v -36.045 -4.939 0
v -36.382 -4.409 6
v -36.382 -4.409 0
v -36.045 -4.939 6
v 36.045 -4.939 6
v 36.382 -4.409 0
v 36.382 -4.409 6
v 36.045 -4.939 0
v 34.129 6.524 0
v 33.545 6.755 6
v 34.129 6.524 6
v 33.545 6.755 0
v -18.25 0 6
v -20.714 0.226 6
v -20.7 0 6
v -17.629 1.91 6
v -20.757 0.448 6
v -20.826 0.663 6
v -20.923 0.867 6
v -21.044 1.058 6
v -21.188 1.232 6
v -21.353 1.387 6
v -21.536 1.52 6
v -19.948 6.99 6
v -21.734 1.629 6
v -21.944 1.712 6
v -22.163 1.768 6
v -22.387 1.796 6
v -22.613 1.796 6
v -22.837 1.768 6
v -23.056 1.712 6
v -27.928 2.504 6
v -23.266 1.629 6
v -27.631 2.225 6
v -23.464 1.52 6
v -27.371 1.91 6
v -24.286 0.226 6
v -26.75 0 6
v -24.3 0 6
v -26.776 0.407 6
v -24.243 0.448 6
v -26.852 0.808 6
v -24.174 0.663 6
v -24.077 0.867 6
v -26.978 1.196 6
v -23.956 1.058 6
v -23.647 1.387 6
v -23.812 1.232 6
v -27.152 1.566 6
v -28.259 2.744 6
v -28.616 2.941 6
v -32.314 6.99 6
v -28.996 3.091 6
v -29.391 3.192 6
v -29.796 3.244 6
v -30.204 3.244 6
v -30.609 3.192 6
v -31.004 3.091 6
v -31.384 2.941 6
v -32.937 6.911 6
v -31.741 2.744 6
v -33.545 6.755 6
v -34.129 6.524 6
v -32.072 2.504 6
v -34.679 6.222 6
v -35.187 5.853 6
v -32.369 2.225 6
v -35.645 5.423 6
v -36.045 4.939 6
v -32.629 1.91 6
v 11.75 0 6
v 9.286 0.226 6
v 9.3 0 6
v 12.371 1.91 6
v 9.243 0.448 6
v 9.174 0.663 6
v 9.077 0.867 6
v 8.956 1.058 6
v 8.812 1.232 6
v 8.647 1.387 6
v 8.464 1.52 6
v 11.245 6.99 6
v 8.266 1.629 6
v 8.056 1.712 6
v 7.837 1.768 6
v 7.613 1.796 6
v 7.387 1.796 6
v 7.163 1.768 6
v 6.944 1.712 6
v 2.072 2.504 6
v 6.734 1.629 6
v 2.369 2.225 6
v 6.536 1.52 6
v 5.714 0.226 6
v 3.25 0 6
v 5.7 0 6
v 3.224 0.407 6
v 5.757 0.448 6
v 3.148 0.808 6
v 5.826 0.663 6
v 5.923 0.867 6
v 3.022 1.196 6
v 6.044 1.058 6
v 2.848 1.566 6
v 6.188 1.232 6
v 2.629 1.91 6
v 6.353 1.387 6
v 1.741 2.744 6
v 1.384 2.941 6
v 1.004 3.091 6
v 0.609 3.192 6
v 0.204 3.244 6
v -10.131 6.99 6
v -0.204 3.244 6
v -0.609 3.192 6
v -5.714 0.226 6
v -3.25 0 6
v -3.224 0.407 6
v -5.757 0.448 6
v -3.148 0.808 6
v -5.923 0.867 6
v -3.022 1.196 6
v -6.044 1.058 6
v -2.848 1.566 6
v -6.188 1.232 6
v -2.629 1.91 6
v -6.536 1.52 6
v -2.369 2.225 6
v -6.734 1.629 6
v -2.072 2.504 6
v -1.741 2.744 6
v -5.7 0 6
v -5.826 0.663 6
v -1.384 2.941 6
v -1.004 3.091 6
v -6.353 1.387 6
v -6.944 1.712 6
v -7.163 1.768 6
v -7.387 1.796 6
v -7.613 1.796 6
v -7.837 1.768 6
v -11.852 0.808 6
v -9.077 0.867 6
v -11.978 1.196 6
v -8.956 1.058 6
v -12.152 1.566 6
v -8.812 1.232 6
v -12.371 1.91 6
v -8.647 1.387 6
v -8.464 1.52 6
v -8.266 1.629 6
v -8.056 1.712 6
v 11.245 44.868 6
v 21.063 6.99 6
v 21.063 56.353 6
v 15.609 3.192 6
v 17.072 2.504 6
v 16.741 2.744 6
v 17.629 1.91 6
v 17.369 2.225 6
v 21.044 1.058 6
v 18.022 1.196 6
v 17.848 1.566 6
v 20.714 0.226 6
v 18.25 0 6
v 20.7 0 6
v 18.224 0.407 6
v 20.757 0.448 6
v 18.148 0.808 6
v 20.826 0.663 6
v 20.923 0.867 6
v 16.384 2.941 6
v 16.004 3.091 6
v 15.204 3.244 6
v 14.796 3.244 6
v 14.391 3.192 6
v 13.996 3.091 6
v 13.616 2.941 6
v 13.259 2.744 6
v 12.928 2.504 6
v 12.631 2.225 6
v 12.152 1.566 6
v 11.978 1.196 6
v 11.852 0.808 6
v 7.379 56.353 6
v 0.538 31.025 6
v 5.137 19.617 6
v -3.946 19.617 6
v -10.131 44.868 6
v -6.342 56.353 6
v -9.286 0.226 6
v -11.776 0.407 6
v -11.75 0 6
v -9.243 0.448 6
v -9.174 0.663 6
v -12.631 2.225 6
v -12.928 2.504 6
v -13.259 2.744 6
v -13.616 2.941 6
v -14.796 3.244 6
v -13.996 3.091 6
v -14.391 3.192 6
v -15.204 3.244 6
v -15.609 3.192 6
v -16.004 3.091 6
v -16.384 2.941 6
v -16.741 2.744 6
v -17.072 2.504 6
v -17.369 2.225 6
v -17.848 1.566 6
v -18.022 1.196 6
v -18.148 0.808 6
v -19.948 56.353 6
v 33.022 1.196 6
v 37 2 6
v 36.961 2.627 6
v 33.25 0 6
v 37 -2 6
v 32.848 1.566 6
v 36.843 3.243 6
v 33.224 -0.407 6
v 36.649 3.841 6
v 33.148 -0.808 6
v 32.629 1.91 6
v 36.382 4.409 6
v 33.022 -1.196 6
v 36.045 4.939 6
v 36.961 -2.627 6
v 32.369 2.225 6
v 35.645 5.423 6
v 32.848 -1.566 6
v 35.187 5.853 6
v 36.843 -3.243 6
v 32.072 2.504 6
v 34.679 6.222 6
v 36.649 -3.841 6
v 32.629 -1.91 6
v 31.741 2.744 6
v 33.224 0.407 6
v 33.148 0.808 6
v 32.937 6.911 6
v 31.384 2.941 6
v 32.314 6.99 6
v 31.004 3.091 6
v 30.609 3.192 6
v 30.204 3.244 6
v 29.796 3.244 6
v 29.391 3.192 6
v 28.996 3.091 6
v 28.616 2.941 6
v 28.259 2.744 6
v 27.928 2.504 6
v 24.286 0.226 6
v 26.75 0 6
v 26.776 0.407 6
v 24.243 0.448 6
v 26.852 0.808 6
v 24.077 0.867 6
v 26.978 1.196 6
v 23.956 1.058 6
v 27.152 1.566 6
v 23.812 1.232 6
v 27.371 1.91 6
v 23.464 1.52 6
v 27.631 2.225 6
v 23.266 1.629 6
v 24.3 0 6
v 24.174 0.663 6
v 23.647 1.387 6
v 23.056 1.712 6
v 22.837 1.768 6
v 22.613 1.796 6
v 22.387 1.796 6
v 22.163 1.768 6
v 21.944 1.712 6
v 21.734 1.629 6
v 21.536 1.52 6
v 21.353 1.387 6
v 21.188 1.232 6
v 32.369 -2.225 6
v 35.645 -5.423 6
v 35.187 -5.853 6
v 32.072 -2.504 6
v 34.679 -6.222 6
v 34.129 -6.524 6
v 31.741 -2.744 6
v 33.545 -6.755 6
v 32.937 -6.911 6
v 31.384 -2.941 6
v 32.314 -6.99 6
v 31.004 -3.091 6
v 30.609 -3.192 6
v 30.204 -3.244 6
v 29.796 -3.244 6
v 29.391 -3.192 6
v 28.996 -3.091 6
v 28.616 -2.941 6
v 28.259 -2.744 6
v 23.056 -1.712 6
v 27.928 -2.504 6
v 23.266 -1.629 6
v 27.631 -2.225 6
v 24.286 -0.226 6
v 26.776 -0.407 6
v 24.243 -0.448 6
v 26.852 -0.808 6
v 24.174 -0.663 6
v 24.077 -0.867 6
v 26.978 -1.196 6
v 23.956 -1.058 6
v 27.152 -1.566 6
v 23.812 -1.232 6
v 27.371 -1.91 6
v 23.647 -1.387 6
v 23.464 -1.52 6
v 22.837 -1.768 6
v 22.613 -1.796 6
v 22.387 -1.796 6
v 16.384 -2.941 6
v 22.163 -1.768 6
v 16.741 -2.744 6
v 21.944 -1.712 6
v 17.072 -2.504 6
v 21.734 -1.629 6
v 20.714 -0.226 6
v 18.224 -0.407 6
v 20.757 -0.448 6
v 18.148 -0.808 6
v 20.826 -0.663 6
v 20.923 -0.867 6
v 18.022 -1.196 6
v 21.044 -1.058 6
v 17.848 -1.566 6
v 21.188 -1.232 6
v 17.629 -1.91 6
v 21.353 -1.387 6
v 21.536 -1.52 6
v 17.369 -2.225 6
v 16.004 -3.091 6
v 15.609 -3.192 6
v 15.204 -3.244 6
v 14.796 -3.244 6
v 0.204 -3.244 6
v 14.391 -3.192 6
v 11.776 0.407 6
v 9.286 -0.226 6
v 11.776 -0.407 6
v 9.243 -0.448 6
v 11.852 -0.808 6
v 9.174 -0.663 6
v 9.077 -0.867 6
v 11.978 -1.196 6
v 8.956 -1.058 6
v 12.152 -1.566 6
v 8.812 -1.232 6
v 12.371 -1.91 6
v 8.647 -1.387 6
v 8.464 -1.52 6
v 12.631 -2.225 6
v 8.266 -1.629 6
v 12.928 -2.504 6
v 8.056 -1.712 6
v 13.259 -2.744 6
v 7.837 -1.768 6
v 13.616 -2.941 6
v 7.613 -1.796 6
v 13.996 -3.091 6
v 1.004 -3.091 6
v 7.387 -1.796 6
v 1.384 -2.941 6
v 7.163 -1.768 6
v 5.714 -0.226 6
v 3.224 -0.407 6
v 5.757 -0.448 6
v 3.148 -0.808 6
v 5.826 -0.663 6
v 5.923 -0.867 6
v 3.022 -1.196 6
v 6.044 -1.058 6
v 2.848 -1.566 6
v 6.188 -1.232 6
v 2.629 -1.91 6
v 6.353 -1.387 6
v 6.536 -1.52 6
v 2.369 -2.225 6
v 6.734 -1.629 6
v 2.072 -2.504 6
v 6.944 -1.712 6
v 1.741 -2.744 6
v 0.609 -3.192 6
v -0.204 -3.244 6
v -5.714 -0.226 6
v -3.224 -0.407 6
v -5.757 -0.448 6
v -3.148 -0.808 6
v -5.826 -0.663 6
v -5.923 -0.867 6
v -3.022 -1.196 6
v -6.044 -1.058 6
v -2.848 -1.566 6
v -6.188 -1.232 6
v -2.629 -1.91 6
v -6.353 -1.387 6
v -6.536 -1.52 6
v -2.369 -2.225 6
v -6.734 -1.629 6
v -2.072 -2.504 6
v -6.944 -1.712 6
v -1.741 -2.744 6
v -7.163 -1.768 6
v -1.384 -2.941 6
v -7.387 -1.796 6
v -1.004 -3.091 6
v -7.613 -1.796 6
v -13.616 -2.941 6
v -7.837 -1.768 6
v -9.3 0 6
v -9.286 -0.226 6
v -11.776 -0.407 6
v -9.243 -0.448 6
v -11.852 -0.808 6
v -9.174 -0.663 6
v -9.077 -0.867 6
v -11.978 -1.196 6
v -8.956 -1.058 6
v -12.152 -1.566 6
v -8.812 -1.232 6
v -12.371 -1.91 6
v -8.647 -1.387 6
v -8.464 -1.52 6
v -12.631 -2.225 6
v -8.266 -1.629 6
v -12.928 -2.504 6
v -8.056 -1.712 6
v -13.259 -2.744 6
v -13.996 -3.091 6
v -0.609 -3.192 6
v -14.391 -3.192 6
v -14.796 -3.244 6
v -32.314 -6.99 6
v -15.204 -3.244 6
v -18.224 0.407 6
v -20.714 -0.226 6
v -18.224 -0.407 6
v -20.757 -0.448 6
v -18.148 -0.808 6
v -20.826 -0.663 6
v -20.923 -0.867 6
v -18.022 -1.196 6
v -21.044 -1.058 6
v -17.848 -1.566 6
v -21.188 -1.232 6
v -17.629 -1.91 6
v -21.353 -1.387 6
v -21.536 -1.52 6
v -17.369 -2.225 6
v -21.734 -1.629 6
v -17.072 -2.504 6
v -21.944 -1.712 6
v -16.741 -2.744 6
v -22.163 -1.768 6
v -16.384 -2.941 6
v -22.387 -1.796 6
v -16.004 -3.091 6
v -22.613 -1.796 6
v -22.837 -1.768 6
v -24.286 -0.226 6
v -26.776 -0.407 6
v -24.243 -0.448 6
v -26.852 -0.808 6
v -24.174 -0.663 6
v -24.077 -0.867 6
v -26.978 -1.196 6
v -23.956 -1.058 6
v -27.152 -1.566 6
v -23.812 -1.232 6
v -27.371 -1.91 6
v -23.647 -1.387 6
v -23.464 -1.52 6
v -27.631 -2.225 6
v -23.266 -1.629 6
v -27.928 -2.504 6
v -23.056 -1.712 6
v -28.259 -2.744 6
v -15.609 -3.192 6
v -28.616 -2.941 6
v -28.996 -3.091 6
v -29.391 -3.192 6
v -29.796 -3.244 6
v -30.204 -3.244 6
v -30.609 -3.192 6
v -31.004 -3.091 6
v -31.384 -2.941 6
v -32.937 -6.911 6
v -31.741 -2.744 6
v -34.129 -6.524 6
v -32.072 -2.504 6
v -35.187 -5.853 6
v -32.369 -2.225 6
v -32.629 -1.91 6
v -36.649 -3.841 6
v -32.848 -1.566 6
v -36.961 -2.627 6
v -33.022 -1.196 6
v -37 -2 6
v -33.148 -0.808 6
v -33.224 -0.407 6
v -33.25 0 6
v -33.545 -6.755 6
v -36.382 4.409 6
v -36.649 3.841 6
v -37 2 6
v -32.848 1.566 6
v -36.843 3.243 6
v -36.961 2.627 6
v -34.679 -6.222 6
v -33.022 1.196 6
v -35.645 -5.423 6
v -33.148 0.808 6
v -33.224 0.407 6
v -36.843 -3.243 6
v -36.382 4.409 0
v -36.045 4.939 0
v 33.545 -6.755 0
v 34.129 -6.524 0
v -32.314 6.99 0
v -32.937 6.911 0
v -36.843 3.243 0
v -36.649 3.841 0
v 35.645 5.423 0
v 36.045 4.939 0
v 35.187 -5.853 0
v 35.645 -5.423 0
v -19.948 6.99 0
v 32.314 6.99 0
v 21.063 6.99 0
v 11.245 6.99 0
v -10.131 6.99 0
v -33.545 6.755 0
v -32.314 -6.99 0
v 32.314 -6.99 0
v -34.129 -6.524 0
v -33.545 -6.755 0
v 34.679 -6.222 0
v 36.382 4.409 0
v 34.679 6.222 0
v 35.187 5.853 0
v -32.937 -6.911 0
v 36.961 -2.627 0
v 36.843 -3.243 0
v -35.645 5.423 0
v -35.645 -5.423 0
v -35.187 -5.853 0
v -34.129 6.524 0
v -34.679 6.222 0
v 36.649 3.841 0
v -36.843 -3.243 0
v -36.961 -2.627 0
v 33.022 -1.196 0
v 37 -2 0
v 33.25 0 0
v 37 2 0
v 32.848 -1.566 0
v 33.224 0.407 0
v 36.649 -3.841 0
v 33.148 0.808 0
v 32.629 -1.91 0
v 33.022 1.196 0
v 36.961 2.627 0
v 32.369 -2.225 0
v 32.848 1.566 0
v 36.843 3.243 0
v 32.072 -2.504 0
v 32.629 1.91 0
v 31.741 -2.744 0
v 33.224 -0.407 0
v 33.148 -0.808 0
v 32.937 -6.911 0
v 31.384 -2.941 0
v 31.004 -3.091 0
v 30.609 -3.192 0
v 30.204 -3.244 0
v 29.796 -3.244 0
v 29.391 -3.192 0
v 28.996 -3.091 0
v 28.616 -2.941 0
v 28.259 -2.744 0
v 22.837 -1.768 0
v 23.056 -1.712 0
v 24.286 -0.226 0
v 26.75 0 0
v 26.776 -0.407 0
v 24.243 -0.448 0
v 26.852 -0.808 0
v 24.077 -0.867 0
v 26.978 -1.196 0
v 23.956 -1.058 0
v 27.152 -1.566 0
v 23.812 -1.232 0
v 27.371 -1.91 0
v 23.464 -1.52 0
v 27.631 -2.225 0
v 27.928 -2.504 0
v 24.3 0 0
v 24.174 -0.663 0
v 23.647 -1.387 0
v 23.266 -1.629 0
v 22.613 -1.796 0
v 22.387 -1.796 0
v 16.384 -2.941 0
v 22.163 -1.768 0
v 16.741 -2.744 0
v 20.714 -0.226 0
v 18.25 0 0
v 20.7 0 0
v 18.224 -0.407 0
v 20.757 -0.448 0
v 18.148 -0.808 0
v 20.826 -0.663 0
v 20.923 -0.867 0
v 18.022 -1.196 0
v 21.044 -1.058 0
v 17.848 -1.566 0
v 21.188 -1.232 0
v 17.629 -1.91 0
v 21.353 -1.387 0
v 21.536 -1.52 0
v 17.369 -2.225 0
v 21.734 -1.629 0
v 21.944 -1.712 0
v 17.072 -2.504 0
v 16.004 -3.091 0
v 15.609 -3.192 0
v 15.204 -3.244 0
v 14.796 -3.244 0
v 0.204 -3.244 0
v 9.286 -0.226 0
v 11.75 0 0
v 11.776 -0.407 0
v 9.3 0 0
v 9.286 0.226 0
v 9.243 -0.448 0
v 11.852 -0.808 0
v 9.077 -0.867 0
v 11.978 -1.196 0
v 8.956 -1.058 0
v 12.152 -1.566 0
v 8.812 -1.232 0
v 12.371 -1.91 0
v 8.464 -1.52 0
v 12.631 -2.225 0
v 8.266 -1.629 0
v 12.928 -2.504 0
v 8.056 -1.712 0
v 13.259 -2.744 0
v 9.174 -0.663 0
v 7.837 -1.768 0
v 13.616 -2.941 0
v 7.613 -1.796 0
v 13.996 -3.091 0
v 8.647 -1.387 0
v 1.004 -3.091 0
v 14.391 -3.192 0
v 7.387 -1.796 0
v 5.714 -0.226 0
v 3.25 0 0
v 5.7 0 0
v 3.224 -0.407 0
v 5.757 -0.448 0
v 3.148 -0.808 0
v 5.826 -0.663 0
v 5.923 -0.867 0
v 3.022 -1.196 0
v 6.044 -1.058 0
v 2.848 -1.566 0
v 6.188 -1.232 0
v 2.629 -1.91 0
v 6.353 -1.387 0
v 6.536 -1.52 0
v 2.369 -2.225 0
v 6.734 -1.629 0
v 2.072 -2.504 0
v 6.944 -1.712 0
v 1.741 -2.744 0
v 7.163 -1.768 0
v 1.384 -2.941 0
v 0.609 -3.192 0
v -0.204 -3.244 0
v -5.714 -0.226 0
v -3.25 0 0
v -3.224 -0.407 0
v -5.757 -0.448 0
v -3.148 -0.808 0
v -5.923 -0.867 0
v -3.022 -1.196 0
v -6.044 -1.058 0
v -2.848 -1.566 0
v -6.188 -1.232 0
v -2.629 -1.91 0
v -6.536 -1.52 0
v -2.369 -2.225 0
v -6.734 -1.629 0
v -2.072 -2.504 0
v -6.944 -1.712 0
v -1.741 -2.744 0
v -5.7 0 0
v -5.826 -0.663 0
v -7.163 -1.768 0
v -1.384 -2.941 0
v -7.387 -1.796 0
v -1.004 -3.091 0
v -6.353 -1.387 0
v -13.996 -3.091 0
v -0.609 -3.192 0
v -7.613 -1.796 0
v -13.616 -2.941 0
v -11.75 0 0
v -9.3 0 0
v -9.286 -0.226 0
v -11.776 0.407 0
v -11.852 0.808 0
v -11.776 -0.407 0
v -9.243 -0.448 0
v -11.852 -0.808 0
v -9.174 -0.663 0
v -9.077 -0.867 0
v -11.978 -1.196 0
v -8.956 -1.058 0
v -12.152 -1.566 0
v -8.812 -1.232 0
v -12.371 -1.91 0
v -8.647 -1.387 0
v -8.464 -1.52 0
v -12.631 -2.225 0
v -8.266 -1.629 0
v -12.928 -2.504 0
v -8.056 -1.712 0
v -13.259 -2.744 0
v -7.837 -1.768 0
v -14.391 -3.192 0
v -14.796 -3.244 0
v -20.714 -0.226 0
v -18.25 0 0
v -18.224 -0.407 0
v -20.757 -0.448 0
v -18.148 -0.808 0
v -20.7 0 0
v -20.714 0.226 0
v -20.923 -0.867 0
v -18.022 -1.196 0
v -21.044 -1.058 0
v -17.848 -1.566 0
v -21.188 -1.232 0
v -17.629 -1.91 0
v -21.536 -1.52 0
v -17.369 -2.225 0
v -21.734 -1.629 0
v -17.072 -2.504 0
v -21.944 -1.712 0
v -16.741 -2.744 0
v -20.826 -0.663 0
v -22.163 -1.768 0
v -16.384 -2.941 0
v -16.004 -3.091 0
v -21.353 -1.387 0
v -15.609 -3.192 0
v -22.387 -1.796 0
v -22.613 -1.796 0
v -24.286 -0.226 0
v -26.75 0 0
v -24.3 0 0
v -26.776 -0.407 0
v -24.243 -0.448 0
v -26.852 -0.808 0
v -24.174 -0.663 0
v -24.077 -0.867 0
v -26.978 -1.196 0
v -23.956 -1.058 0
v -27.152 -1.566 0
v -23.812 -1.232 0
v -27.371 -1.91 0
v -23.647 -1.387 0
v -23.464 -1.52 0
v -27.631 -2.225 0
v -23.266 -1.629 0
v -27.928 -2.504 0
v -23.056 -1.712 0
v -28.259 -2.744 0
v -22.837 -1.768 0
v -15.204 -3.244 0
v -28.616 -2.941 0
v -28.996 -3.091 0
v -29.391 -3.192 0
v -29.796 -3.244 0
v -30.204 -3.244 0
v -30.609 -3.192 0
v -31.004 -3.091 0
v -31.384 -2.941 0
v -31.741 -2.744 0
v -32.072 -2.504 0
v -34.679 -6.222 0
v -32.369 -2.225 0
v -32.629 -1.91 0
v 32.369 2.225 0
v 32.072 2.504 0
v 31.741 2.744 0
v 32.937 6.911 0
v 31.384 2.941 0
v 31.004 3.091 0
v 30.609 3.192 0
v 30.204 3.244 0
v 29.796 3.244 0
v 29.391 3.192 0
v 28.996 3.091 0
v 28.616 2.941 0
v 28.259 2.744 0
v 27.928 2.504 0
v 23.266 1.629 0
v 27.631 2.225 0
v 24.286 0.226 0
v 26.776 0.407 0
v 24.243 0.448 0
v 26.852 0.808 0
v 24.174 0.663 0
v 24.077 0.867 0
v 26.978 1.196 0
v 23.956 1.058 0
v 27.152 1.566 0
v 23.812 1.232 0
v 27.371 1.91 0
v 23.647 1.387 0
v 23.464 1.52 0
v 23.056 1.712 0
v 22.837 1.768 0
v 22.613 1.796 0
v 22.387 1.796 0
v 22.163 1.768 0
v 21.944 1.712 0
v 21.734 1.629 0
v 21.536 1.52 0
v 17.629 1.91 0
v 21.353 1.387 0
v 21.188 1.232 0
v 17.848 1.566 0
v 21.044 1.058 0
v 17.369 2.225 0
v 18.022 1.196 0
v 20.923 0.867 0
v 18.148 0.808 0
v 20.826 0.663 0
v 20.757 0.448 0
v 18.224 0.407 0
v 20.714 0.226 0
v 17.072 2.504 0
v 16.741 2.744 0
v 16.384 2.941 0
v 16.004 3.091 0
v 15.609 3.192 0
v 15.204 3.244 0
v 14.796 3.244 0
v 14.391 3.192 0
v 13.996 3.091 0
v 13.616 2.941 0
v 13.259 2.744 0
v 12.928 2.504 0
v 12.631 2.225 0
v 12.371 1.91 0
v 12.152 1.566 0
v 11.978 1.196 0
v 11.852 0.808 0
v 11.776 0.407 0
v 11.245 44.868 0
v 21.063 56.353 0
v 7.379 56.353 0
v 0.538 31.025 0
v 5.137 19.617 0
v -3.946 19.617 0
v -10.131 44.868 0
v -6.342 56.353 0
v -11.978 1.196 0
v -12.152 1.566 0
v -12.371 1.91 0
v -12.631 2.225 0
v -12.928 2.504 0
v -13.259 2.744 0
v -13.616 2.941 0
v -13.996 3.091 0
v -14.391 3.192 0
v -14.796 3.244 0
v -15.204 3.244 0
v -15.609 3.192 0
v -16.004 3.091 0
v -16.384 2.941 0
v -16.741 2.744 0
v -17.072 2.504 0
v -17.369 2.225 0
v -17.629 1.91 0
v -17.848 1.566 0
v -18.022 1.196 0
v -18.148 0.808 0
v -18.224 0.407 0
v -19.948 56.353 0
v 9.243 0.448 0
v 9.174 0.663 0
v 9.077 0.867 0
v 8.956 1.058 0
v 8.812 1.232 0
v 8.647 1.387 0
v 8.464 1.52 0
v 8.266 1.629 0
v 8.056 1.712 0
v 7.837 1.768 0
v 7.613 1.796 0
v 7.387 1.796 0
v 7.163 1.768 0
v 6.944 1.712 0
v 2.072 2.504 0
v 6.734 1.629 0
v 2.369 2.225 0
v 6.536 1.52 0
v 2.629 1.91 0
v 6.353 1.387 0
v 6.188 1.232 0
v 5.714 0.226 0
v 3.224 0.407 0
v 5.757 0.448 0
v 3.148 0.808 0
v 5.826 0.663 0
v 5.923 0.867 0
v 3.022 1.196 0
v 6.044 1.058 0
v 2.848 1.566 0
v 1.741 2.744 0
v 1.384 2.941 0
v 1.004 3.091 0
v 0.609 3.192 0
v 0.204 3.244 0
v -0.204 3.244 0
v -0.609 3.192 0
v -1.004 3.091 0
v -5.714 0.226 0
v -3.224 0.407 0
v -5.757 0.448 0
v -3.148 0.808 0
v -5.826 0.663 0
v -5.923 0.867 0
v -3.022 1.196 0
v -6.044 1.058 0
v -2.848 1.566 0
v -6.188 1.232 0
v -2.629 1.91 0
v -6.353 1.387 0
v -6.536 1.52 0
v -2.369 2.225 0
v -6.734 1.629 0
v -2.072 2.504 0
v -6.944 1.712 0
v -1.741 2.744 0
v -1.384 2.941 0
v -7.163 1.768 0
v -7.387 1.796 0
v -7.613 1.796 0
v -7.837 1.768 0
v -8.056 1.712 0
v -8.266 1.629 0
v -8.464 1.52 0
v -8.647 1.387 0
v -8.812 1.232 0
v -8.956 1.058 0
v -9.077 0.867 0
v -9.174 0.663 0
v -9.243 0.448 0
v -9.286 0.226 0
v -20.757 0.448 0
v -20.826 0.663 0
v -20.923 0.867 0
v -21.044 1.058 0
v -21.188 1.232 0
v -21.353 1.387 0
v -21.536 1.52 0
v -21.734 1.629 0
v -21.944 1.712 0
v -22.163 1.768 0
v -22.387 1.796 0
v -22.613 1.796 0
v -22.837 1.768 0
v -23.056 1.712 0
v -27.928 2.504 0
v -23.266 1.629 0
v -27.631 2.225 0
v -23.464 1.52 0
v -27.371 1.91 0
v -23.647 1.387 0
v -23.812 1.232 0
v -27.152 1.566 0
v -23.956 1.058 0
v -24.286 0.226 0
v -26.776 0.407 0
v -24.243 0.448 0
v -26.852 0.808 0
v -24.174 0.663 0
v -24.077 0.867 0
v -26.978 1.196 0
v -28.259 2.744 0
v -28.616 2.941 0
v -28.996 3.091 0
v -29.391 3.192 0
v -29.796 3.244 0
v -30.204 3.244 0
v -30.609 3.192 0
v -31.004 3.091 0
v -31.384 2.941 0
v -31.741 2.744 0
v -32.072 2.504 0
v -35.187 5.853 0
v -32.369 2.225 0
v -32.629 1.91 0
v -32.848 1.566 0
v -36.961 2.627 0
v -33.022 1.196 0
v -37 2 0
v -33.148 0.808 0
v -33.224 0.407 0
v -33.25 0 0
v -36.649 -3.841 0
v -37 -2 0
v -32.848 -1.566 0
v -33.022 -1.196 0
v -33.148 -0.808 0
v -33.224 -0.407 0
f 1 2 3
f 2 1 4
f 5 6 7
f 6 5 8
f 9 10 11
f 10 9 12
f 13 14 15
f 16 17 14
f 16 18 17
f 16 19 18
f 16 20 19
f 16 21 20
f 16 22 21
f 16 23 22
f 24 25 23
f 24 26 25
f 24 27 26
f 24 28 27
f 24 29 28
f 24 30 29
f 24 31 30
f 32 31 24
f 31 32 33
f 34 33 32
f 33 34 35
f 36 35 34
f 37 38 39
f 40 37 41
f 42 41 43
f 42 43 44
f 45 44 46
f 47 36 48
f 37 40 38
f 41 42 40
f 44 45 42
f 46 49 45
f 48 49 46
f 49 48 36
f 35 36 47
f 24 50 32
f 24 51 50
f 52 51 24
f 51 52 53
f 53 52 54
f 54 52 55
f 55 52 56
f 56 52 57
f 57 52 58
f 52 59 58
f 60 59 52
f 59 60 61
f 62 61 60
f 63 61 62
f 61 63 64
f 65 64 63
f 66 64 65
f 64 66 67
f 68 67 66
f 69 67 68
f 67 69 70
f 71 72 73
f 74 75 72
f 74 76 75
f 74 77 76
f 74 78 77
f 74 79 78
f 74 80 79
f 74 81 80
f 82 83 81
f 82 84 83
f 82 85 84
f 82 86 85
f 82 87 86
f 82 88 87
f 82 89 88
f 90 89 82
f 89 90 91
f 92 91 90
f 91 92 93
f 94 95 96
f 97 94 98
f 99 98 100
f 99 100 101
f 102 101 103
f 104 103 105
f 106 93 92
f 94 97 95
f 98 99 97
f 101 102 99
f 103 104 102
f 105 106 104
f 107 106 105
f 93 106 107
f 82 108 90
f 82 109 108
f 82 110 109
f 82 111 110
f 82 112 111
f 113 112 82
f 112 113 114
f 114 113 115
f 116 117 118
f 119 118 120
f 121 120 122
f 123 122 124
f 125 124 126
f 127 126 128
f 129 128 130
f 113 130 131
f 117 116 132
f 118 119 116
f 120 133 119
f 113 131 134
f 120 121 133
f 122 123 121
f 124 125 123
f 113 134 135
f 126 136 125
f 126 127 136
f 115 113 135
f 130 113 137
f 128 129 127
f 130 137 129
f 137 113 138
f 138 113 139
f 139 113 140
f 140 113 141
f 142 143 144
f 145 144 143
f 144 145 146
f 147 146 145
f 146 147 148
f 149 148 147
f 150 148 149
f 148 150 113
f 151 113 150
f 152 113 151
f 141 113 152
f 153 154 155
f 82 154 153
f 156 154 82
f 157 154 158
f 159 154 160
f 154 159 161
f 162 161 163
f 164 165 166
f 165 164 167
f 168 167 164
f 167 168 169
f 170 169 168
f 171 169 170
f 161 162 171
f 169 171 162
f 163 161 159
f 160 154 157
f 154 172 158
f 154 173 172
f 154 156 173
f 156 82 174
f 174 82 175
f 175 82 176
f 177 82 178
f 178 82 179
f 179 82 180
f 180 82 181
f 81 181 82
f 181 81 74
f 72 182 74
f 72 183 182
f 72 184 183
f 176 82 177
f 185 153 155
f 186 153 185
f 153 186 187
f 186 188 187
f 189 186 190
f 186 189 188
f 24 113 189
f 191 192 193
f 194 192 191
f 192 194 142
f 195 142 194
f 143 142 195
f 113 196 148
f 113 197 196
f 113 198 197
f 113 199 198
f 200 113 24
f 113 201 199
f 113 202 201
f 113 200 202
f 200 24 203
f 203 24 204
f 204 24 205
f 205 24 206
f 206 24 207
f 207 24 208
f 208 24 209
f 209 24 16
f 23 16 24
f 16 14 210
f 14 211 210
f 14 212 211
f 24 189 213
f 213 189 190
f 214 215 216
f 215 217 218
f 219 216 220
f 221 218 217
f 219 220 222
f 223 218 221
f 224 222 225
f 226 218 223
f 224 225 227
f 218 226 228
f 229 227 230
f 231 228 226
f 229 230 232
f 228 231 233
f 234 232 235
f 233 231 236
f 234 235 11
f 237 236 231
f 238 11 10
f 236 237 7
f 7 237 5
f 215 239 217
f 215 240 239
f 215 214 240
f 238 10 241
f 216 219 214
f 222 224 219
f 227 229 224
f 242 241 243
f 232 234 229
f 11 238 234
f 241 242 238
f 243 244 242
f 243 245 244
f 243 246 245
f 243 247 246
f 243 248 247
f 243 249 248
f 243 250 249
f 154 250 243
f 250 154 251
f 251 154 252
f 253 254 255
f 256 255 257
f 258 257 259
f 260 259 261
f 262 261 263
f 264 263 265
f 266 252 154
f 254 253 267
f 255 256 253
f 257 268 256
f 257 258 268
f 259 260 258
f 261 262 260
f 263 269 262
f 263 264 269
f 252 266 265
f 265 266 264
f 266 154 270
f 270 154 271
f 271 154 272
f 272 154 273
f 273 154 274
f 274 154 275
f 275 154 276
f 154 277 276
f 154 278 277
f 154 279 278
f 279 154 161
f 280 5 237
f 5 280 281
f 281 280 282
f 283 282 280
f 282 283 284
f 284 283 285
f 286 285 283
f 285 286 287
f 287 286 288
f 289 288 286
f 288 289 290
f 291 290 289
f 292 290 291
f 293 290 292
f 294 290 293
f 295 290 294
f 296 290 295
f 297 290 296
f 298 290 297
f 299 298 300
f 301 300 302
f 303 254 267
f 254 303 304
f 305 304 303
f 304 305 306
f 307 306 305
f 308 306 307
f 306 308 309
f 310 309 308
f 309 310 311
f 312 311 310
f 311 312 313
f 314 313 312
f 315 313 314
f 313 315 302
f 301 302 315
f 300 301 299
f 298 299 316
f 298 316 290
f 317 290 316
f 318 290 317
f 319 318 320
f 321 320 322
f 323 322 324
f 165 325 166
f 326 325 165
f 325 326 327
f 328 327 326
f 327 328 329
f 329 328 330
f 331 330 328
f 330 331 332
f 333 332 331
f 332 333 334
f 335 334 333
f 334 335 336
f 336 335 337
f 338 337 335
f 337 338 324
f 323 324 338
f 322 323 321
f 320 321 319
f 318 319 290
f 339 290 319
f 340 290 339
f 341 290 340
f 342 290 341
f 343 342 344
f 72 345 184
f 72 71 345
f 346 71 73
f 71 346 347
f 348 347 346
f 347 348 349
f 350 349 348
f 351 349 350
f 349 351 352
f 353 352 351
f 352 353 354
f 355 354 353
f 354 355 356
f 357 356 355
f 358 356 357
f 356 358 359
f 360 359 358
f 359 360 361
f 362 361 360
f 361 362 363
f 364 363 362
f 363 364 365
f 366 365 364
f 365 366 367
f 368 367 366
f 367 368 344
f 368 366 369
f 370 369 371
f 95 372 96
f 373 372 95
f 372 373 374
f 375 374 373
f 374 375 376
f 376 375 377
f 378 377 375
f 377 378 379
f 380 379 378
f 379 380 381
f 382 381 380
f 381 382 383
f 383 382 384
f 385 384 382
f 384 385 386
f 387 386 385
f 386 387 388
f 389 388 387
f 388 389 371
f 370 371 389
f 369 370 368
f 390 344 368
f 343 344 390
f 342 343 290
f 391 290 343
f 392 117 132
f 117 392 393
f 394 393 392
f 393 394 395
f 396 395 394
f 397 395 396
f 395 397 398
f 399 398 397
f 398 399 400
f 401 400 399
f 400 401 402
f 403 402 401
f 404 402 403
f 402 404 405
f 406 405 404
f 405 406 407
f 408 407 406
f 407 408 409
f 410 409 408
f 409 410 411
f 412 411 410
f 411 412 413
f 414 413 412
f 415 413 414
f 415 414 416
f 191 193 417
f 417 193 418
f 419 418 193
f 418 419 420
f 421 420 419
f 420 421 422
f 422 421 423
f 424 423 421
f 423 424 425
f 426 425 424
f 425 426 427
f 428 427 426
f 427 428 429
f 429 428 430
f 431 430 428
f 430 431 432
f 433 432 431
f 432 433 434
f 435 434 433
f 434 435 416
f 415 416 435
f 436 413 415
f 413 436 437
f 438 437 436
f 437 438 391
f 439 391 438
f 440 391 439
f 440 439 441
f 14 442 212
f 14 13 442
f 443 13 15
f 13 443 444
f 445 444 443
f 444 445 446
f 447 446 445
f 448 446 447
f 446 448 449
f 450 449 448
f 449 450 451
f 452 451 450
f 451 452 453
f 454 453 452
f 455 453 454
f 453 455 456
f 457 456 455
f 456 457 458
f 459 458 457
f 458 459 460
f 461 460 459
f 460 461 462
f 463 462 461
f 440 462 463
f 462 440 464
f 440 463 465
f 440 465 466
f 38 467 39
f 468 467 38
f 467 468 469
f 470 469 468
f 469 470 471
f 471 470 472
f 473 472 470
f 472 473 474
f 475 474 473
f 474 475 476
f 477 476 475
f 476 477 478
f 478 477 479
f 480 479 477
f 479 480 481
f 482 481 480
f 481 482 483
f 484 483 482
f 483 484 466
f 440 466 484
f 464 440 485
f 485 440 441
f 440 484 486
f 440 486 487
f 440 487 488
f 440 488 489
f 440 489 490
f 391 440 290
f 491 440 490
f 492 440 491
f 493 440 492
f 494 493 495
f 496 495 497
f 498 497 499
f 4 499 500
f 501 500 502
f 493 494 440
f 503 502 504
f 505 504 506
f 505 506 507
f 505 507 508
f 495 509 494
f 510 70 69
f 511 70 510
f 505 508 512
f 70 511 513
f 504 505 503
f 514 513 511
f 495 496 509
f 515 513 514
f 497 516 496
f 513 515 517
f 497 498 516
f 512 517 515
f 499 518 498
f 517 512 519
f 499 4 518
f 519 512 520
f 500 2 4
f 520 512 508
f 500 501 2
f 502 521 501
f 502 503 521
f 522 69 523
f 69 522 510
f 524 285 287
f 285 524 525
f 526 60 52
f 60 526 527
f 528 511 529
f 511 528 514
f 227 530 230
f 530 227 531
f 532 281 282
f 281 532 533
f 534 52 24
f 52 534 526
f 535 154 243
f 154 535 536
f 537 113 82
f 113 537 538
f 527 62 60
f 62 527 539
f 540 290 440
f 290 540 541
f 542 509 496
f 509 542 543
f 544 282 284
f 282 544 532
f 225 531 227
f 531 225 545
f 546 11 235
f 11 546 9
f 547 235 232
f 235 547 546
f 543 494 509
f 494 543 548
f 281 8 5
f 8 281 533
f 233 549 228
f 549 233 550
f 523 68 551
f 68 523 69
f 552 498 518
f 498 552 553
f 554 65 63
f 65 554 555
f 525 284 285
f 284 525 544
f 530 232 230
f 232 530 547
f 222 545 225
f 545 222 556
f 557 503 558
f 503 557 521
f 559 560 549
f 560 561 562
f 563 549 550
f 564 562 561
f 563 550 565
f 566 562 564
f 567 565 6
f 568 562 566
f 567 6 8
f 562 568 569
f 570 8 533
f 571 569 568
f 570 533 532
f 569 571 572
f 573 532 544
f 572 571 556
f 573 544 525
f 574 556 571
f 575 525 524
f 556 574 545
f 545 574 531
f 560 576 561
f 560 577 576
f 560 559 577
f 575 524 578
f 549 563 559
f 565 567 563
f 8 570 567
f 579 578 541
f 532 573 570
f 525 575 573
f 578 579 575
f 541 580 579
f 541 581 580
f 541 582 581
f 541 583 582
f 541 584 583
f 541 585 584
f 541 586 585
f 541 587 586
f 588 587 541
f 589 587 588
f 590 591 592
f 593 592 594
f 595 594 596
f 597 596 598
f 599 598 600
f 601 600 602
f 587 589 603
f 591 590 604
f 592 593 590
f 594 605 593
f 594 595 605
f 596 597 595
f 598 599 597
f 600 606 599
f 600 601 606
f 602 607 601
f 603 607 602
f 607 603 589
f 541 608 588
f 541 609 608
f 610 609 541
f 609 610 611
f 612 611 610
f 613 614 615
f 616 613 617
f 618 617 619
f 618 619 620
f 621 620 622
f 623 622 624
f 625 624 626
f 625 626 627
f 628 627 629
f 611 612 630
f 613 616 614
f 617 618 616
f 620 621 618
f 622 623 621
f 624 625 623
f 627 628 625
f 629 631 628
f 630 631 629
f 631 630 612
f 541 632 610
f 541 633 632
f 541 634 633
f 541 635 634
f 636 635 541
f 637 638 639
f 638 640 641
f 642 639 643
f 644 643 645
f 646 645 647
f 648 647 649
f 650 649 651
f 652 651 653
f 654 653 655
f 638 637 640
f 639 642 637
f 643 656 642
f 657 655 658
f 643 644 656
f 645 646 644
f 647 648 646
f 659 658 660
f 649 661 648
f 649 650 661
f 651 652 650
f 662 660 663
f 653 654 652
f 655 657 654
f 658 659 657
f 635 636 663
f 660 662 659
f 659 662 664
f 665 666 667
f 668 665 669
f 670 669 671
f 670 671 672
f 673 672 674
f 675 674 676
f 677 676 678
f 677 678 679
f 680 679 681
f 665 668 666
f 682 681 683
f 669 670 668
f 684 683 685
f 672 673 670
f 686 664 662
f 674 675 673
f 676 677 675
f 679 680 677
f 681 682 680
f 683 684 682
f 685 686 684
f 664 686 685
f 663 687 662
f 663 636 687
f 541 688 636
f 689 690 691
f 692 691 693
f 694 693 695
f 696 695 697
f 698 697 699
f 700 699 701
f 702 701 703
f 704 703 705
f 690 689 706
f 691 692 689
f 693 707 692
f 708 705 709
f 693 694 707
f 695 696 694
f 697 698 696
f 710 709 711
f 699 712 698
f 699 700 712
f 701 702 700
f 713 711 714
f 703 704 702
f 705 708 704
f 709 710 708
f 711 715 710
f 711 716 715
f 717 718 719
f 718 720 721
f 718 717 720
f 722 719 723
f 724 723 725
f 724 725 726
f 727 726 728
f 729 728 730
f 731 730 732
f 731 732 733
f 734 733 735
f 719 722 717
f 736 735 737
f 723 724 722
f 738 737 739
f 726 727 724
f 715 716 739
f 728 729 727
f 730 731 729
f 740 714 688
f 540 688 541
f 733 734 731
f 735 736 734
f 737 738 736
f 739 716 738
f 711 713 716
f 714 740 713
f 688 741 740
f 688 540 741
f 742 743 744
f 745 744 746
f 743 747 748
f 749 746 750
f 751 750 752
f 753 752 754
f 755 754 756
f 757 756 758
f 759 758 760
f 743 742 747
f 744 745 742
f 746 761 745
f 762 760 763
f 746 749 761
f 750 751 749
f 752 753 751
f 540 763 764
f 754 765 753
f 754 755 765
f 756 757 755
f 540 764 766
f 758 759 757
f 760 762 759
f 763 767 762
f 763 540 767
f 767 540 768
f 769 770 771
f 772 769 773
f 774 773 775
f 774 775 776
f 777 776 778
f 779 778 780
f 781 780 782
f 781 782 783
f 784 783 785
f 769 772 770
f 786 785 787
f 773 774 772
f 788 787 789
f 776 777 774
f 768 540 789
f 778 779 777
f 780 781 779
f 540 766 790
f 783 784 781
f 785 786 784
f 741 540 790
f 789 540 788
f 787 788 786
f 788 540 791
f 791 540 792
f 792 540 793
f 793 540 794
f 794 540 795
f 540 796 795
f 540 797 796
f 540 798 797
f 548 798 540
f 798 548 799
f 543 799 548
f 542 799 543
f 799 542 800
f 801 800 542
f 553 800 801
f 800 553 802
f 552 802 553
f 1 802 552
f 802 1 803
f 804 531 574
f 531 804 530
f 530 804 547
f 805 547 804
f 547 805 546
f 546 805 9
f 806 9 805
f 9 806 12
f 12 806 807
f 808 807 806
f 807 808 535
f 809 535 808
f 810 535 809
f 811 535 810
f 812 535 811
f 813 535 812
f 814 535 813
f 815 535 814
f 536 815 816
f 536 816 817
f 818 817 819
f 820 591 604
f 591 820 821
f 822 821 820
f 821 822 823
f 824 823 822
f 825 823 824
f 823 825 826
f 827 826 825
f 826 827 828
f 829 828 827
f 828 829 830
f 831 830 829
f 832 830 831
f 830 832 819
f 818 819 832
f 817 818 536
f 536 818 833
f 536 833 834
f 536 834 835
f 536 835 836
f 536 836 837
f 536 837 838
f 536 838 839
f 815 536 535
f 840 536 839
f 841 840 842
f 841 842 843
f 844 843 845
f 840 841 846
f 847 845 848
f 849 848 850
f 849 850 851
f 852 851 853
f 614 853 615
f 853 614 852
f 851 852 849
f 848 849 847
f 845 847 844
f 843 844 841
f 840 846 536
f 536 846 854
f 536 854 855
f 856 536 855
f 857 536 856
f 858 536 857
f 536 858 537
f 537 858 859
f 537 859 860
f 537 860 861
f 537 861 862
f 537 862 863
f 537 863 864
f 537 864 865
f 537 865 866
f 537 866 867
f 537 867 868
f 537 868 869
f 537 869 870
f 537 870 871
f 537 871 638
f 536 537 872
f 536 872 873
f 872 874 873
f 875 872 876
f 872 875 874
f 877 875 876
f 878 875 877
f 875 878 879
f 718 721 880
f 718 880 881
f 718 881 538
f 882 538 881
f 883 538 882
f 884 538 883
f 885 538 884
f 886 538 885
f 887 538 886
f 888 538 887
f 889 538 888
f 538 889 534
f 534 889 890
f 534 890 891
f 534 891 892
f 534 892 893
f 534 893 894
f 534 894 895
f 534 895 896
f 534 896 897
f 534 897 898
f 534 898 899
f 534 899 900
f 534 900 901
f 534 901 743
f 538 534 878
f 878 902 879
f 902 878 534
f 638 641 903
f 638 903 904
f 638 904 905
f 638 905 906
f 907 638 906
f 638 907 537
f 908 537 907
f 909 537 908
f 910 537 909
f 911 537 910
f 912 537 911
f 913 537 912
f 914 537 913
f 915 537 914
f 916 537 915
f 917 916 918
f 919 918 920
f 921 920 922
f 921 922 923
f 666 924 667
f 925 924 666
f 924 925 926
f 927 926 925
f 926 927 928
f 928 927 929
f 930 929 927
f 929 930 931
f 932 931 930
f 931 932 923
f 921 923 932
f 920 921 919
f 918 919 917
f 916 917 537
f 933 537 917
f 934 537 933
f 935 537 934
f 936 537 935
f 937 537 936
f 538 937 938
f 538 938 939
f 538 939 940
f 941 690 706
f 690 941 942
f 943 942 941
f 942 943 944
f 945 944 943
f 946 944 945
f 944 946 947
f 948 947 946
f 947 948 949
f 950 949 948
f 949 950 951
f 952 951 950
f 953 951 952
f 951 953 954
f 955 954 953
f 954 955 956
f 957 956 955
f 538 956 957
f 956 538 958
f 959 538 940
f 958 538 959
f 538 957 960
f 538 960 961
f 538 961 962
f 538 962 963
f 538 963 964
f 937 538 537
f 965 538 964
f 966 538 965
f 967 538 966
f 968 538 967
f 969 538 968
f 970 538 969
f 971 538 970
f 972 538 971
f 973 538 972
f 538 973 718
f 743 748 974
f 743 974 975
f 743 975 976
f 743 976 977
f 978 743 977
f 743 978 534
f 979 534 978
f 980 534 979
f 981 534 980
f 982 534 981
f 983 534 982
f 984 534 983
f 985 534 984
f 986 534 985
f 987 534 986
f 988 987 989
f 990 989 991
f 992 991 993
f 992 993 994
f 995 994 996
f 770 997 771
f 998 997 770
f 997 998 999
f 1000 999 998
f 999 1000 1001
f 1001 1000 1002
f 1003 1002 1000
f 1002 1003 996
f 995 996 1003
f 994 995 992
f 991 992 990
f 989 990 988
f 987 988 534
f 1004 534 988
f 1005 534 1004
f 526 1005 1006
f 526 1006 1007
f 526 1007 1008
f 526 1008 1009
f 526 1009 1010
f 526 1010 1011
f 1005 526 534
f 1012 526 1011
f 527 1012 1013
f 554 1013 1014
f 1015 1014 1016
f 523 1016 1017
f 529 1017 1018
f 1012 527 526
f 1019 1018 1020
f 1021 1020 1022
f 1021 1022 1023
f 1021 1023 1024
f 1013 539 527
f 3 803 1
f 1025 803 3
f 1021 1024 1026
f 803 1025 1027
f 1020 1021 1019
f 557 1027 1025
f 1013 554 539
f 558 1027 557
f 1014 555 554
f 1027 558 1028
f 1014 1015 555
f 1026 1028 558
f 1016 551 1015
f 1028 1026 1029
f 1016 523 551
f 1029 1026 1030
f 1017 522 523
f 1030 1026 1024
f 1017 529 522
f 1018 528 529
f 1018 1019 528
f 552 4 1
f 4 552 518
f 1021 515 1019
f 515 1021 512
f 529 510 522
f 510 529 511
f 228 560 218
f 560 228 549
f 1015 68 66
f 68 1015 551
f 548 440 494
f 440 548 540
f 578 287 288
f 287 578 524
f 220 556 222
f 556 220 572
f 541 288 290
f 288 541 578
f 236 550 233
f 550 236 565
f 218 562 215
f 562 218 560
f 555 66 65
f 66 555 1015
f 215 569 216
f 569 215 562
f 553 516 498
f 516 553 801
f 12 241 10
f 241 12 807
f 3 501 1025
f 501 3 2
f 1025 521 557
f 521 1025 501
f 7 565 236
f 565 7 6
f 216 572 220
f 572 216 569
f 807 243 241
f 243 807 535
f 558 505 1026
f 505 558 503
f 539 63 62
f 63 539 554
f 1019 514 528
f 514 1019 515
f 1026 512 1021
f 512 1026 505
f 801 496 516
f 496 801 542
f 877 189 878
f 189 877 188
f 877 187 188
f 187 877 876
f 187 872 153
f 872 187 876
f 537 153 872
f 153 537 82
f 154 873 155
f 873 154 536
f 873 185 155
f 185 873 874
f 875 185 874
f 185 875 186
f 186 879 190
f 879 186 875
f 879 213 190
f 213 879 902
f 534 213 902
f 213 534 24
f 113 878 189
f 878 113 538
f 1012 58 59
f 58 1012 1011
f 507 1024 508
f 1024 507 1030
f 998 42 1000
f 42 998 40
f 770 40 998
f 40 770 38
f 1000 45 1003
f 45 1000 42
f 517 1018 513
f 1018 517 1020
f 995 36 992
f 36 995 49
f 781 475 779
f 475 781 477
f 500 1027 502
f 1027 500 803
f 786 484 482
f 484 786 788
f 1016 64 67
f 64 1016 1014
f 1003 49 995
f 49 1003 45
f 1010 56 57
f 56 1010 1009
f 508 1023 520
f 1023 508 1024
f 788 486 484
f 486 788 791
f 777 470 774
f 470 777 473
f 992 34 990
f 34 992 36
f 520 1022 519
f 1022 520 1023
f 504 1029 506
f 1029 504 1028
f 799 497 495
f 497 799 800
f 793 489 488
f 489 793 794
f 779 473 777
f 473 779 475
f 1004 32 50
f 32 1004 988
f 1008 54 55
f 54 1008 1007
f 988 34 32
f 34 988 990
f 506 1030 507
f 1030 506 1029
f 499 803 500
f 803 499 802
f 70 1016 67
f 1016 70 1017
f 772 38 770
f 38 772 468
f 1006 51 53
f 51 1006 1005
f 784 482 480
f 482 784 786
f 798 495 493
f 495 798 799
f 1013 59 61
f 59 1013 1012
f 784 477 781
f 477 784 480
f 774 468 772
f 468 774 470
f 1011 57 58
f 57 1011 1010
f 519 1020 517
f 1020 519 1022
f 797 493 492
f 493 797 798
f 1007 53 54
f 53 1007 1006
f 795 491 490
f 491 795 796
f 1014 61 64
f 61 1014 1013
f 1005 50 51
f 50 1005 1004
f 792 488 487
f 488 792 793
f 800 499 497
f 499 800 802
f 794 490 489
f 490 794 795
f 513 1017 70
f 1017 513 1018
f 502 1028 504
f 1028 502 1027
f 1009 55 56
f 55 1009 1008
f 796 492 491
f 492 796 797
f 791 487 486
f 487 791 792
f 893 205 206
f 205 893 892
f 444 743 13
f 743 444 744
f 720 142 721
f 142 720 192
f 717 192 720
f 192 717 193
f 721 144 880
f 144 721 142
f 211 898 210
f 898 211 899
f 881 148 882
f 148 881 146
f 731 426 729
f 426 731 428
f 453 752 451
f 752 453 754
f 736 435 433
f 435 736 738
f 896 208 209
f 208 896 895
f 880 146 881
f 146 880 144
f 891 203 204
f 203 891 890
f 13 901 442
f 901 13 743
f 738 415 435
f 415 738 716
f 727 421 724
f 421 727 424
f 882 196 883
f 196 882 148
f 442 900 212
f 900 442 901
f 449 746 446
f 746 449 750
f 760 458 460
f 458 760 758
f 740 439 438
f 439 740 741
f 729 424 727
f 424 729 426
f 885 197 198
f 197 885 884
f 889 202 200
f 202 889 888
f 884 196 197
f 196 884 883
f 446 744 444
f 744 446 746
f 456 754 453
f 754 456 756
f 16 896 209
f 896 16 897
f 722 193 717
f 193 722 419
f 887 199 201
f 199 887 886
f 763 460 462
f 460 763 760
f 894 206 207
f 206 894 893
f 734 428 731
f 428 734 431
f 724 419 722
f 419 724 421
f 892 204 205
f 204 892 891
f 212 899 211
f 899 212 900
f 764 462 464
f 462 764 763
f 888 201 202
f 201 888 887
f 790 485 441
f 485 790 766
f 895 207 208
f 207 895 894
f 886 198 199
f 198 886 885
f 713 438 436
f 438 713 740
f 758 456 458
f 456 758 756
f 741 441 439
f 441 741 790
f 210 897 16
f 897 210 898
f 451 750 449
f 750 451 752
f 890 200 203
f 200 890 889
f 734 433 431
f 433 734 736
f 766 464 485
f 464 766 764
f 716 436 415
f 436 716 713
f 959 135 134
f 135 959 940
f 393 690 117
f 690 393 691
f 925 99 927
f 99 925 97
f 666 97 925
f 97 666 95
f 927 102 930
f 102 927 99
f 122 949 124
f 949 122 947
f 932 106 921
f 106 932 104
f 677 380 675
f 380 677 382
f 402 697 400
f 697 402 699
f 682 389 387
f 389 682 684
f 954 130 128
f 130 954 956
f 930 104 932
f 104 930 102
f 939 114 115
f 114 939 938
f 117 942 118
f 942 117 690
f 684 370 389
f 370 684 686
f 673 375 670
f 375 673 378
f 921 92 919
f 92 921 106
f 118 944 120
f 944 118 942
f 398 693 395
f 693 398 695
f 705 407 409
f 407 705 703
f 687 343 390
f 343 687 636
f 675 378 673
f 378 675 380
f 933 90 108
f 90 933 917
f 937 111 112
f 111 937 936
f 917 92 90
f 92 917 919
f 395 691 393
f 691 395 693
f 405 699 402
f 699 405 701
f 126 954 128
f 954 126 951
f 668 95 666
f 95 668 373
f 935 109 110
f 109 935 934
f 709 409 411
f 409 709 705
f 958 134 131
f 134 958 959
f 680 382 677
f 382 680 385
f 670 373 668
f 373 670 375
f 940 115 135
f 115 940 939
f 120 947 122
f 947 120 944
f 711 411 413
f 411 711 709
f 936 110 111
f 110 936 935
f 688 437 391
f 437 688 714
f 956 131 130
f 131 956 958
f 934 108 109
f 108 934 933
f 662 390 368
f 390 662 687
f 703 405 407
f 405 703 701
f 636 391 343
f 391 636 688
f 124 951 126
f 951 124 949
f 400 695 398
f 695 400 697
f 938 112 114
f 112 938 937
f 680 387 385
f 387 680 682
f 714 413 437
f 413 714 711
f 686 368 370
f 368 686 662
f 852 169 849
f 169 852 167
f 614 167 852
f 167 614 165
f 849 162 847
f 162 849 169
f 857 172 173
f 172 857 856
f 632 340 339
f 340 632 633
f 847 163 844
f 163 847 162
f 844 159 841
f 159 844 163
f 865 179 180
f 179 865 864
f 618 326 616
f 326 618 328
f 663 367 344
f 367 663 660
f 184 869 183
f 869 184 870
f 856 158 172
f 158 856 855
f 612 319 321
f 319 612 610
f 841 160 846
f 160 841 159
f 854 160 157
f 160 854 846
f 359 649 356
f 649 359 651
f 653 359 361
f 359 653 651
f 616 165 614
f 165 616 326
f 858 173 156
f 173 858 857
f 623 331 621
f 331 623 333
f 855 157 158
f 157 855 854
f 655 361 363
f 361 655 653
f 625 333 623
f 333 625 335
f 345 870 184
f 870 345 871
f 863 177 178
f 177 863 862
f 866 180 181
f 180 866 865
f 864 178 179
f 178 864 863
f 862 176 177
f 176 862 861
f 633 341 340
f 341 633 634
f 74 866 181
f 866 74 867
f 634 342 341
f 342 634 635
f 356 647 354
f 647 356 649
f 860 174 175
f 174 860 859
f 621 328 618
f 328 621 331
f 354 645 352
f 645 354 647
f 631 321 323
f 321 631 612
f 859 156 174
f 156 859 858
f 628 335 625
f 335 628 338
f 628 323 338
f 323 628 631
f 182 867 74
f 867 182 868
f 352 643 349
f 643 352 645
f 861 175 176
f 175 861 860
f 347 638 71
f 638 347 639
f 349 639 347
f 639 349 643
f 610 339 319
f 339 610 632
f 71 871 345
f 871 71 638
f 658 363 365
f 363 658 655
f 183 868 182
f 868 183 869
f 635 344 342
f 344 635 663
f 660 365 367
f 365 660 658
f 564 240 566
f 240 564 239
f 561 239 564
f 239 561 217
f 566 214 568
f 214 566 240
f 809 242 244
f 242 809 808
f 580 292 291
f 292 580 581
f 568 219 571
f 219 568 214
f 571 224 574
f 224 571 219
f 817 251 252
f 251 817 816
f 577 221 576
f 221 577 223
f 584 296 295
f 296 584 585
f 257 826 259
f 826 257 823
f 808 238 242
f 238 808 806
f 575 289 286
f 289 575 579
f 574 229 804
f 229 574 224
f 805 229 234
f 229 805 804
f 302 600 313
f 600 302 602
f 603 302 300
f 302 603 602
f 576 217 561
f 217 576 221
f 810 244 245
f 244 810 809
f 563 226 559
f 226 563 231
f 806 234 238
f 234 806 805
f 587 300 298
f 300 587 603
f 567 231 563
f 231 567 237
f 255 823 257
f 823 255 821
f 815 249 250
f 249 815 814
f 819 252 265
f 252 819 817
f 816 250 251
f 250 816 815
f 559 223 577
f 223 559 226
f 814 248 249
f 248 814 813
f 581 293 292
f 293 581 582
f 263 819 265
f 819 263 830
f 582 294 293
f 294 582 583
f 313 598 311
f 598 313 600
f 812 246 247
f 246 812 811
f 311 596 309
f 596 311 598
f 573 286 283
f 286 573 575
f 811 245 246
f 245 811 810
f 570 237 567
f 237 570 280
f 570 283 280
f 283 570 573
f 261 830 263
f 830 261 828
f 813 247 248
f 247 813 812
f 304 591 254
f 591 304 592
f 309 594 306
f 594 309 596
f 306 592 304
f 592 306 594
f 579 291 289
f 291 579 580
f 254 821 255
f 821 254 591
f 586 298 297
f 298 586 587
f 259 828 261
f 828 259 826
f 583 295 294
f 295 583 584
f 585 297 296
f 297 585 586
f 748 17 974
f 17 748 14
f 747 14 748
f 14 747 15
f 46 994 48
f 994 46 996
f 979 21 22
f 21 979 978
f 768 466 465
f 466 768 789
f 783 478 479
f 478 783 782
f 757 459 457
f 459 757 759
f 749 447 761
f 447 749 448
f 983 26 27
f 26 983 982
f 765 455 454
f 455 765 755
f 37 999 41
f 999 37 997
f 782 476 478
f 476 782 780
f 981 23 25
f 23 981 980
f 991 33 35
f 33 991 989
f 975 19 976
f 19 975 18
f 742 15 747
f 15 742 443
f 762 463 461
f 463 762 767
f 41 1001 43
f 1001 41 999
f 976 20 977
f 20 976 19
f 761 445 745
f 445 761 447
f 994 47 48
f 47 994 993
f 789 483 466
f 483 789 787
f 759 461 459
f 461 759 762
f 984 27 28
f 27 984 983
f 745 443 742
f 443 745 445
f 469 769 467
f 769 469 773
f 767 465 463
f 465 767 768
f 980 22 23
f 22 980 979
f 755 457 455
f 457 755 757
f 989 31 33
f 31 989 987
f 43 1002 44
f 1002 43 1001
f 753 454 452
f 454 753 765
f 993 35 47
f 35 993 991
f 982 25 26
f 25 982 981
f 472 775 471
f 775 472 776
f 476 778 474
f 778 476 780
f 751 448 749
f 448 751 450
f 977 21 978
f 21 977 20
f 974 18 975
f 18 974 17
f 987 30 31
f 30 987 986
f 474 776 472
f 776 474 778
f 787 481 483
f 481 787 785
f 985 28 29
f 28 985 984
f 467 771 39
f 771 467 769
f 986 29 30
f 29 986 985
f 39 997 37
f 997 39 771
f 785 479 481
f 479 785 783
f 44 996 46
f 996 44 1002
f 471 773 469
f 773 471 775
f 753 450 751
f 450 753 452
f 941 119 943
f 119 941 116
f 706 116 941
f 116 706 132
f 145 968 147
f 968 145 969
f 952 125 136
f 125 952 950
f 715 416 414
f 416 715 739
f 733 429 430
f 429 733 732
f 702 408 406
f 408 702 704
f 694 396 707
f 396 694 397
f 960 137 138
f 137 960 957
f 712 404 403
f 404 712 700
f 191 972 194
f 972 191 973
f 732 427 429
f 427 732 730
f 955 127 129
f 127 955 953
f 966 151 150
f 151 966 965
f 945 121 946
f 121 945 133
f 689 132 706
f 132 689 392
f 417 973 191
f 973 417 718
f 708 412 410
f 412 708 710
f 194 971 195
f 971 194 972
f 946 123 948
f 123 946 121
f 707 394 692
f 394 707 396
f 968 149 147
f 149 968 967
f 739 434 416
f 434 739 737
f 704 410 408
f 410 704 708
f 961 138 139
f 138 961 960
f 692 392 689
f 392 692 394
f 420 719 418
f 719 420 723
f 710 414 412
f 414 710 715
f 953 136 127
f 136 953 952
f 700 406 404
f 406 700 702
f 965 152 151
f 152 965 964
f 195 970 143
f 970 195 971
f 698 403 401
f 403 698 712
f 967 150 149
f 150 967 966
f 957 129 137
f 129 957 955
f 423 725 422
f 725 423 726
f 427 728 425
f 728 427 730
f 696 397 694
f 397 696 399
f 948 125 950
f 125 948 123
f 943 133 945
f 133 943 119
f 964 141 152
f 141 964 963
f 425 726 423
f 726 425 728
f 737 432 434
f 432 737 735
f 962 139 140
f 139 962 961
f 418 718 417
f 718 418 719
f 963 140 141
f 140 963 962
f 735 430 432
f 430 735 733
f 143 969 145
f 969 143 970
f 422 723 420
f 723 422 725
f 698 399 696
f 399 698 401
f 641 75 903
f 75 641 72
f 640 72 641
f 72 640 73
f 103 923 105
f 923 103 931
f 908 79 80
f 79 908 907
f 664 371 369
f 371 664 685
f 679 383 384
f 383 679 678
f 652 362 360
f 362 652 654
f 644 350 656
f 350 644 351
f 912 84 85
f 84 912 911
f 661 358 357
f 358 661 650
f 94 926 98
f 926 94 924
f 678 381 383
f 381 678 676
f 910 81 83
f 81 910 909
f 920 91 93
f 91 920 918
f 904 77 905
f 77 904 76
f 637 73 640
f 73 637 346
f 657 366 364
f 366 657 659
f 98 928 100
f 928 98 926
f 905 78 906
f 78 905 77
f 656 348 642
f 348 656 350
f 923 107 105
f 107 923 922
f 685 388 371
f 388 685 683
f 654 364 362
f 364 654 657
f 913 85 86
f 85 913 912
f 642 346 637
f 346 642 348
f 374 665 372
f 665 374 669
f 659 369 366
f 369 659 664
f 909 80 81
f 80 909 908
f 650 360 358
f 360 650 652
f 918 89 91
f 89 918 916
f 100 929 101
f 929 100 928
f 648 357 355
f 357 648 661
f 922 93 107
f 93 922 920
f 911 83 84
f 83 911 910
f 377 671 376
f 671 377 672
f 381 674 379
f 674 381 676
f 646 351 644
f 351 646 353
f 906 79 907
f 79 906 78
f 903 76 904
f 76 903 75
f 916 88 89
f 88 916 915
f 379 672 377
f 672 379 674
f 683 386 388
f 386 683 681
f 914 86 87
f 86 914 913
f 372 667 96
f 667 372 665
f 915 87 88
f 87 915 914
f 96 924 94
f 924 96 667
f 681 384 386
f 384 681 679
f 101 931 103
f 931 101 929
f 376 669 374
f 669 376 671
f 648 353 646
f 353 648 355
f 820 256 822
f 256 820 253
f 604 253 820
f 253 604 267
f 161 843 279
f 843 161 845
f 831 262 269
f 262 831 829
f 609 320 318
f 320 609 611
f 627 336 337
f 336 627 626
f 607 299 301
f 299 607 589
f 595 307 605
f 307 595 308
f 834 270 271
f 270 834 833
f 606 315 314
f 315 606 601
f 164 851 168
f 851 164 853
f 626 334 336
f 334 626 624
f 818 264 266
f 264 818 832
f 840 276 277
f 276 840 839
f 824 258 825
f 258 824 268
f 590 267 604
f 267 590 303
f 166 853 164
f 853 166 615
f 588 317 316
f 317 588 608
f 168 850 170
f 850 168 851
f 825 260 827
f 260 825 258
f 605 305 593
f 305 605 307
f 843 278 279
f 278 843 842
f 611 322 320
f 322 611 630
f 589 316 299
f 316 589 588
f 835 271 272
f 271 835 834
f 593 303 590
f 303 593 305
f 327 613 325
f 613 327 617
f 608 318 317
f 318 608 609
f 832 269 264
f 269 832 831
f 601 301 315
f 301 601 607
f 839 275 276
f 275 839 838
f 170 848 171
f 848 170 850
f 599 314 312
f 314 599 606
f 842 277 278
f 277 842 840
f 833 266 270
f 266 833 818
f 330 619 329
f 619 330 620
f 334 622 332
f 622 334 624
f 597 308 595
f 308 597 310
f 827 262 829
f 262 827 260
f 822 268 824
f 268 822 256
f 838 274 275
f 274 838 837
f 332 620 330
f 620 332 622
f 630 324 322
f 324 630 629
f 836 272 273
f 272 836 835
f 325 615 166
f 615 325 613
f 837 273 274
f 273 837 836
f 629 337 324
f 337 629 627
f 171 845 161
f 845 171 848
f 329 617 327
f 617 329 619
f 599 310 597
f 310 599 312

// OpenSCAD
$fn = 50;


difference() {
	union() {
		hull() {
			translate(v = [-32.0000000000, 2.0000000000, 0]) {
				cylinder(h = 6, r = 5);
			}
			translate(v = [32.0000000000, 2.0000000000, 0]) {
				cylinder(h = 6, r = 5);
			}
			translate(v = [-32.0000000000, -2.0000000000, 0]) {
				cylinder(h = 6, r = 5);
			}
			translate(v = [32.0000000000, -2.0000000000, 0]) {
				cylinder(h = 6, r = 5);
			}
		}
		translate(v = [0, 55, 0]) {
			linear_extrude(height = 6) {
				text(font = "DejaVu Sans Mono:style=Bold", halign = "center", size = 57.0000000000, text = "M", valign = "top");
			}
		}
	}
	union() {
		translate(v = [-30.0000000000, 0.0000000000, 0]) {
			translate(v = [0, 0, -100]) {
				cylinder(h = 200, r = 3.2500000000);
			}
		}
		translate(v = [-15.0000000000, 0.0000000000, 0]) {
			translate(v = [0, 0, -100]) {
				cylinder(h = 200, r = 3.2500000000);
			}
		}
		translate(v = [0, 0, -100]) {
			cylinder(h = 200, r = 3.2500000000);
		}
		translate(v = [15.0000000000, 0.0000000000, 0]) {
			translate(v = [0, 0, -100]) {
				cylinder(h = 200, r = 3.2500000000);
			}
		}
		translate(v = [30.0000000000, 0.0000000000, 0]) {
			translate(v = [0, 0, -100]) {
				cylinder(h = 200, r = 3.2500000000);
			}
		}
		translate(v = [-30.0000000000, 0.0000000000, 0]) {
			translate(v = [0, 0, -100]) {
				cylinder(h = 200, r = 1.8000000000);
			}
		}
		translate(v = [-22.5000000000, 0.0000000000, 0]) {
			translate(v = [0, 0, -100]) {
				cylinder(h = 200, r = 1.8000000000);
			}
		}
		translate(v = [-15.0000000000, 0.0000000000, 0]) {
			translate(v = [0, 0, -100]) {
				cylinder(h = 200, r = 1.8000000000);
			}
		}
		translate(v = [-7.5000000000, 0.0000000000, 0]) {
			translate(v = [0, 0, -100]) {
				cylinder(h = 200, r = 1.8000000000);
			}
		}
		translate(v = [0, 0, -100]) {
			cylinder(h = 200, r = 1.8000000000);
		}
		translate(v = [7.5000000000, 0.0000000000, 0]) {
			translate(v = [0, 0, -100]) {
				cylinder(h = 200, r = 1.8000000000);
			}
		}
		translate(v = [15.0000000000, 0.0000000000, 0]) {
			translate(v = [0, 0, -100]) {
				cylinder(h = 200, r = 1.8000000000);
			}
		}
		translate(v = [22.5000000000, 0.0000000000, 0]) {
			translate(v = [0, 0, -100]) {
				cylinder(h = 200, r = 1.8000000000);
			}
		}
		translate(v = [30.0000000000, 0.0000000000, 0]) {
			translate(v = [0, 0, -100]) {
				cylinder(h = 200, r = 1.8000000000);
			}
		}
	}
}
